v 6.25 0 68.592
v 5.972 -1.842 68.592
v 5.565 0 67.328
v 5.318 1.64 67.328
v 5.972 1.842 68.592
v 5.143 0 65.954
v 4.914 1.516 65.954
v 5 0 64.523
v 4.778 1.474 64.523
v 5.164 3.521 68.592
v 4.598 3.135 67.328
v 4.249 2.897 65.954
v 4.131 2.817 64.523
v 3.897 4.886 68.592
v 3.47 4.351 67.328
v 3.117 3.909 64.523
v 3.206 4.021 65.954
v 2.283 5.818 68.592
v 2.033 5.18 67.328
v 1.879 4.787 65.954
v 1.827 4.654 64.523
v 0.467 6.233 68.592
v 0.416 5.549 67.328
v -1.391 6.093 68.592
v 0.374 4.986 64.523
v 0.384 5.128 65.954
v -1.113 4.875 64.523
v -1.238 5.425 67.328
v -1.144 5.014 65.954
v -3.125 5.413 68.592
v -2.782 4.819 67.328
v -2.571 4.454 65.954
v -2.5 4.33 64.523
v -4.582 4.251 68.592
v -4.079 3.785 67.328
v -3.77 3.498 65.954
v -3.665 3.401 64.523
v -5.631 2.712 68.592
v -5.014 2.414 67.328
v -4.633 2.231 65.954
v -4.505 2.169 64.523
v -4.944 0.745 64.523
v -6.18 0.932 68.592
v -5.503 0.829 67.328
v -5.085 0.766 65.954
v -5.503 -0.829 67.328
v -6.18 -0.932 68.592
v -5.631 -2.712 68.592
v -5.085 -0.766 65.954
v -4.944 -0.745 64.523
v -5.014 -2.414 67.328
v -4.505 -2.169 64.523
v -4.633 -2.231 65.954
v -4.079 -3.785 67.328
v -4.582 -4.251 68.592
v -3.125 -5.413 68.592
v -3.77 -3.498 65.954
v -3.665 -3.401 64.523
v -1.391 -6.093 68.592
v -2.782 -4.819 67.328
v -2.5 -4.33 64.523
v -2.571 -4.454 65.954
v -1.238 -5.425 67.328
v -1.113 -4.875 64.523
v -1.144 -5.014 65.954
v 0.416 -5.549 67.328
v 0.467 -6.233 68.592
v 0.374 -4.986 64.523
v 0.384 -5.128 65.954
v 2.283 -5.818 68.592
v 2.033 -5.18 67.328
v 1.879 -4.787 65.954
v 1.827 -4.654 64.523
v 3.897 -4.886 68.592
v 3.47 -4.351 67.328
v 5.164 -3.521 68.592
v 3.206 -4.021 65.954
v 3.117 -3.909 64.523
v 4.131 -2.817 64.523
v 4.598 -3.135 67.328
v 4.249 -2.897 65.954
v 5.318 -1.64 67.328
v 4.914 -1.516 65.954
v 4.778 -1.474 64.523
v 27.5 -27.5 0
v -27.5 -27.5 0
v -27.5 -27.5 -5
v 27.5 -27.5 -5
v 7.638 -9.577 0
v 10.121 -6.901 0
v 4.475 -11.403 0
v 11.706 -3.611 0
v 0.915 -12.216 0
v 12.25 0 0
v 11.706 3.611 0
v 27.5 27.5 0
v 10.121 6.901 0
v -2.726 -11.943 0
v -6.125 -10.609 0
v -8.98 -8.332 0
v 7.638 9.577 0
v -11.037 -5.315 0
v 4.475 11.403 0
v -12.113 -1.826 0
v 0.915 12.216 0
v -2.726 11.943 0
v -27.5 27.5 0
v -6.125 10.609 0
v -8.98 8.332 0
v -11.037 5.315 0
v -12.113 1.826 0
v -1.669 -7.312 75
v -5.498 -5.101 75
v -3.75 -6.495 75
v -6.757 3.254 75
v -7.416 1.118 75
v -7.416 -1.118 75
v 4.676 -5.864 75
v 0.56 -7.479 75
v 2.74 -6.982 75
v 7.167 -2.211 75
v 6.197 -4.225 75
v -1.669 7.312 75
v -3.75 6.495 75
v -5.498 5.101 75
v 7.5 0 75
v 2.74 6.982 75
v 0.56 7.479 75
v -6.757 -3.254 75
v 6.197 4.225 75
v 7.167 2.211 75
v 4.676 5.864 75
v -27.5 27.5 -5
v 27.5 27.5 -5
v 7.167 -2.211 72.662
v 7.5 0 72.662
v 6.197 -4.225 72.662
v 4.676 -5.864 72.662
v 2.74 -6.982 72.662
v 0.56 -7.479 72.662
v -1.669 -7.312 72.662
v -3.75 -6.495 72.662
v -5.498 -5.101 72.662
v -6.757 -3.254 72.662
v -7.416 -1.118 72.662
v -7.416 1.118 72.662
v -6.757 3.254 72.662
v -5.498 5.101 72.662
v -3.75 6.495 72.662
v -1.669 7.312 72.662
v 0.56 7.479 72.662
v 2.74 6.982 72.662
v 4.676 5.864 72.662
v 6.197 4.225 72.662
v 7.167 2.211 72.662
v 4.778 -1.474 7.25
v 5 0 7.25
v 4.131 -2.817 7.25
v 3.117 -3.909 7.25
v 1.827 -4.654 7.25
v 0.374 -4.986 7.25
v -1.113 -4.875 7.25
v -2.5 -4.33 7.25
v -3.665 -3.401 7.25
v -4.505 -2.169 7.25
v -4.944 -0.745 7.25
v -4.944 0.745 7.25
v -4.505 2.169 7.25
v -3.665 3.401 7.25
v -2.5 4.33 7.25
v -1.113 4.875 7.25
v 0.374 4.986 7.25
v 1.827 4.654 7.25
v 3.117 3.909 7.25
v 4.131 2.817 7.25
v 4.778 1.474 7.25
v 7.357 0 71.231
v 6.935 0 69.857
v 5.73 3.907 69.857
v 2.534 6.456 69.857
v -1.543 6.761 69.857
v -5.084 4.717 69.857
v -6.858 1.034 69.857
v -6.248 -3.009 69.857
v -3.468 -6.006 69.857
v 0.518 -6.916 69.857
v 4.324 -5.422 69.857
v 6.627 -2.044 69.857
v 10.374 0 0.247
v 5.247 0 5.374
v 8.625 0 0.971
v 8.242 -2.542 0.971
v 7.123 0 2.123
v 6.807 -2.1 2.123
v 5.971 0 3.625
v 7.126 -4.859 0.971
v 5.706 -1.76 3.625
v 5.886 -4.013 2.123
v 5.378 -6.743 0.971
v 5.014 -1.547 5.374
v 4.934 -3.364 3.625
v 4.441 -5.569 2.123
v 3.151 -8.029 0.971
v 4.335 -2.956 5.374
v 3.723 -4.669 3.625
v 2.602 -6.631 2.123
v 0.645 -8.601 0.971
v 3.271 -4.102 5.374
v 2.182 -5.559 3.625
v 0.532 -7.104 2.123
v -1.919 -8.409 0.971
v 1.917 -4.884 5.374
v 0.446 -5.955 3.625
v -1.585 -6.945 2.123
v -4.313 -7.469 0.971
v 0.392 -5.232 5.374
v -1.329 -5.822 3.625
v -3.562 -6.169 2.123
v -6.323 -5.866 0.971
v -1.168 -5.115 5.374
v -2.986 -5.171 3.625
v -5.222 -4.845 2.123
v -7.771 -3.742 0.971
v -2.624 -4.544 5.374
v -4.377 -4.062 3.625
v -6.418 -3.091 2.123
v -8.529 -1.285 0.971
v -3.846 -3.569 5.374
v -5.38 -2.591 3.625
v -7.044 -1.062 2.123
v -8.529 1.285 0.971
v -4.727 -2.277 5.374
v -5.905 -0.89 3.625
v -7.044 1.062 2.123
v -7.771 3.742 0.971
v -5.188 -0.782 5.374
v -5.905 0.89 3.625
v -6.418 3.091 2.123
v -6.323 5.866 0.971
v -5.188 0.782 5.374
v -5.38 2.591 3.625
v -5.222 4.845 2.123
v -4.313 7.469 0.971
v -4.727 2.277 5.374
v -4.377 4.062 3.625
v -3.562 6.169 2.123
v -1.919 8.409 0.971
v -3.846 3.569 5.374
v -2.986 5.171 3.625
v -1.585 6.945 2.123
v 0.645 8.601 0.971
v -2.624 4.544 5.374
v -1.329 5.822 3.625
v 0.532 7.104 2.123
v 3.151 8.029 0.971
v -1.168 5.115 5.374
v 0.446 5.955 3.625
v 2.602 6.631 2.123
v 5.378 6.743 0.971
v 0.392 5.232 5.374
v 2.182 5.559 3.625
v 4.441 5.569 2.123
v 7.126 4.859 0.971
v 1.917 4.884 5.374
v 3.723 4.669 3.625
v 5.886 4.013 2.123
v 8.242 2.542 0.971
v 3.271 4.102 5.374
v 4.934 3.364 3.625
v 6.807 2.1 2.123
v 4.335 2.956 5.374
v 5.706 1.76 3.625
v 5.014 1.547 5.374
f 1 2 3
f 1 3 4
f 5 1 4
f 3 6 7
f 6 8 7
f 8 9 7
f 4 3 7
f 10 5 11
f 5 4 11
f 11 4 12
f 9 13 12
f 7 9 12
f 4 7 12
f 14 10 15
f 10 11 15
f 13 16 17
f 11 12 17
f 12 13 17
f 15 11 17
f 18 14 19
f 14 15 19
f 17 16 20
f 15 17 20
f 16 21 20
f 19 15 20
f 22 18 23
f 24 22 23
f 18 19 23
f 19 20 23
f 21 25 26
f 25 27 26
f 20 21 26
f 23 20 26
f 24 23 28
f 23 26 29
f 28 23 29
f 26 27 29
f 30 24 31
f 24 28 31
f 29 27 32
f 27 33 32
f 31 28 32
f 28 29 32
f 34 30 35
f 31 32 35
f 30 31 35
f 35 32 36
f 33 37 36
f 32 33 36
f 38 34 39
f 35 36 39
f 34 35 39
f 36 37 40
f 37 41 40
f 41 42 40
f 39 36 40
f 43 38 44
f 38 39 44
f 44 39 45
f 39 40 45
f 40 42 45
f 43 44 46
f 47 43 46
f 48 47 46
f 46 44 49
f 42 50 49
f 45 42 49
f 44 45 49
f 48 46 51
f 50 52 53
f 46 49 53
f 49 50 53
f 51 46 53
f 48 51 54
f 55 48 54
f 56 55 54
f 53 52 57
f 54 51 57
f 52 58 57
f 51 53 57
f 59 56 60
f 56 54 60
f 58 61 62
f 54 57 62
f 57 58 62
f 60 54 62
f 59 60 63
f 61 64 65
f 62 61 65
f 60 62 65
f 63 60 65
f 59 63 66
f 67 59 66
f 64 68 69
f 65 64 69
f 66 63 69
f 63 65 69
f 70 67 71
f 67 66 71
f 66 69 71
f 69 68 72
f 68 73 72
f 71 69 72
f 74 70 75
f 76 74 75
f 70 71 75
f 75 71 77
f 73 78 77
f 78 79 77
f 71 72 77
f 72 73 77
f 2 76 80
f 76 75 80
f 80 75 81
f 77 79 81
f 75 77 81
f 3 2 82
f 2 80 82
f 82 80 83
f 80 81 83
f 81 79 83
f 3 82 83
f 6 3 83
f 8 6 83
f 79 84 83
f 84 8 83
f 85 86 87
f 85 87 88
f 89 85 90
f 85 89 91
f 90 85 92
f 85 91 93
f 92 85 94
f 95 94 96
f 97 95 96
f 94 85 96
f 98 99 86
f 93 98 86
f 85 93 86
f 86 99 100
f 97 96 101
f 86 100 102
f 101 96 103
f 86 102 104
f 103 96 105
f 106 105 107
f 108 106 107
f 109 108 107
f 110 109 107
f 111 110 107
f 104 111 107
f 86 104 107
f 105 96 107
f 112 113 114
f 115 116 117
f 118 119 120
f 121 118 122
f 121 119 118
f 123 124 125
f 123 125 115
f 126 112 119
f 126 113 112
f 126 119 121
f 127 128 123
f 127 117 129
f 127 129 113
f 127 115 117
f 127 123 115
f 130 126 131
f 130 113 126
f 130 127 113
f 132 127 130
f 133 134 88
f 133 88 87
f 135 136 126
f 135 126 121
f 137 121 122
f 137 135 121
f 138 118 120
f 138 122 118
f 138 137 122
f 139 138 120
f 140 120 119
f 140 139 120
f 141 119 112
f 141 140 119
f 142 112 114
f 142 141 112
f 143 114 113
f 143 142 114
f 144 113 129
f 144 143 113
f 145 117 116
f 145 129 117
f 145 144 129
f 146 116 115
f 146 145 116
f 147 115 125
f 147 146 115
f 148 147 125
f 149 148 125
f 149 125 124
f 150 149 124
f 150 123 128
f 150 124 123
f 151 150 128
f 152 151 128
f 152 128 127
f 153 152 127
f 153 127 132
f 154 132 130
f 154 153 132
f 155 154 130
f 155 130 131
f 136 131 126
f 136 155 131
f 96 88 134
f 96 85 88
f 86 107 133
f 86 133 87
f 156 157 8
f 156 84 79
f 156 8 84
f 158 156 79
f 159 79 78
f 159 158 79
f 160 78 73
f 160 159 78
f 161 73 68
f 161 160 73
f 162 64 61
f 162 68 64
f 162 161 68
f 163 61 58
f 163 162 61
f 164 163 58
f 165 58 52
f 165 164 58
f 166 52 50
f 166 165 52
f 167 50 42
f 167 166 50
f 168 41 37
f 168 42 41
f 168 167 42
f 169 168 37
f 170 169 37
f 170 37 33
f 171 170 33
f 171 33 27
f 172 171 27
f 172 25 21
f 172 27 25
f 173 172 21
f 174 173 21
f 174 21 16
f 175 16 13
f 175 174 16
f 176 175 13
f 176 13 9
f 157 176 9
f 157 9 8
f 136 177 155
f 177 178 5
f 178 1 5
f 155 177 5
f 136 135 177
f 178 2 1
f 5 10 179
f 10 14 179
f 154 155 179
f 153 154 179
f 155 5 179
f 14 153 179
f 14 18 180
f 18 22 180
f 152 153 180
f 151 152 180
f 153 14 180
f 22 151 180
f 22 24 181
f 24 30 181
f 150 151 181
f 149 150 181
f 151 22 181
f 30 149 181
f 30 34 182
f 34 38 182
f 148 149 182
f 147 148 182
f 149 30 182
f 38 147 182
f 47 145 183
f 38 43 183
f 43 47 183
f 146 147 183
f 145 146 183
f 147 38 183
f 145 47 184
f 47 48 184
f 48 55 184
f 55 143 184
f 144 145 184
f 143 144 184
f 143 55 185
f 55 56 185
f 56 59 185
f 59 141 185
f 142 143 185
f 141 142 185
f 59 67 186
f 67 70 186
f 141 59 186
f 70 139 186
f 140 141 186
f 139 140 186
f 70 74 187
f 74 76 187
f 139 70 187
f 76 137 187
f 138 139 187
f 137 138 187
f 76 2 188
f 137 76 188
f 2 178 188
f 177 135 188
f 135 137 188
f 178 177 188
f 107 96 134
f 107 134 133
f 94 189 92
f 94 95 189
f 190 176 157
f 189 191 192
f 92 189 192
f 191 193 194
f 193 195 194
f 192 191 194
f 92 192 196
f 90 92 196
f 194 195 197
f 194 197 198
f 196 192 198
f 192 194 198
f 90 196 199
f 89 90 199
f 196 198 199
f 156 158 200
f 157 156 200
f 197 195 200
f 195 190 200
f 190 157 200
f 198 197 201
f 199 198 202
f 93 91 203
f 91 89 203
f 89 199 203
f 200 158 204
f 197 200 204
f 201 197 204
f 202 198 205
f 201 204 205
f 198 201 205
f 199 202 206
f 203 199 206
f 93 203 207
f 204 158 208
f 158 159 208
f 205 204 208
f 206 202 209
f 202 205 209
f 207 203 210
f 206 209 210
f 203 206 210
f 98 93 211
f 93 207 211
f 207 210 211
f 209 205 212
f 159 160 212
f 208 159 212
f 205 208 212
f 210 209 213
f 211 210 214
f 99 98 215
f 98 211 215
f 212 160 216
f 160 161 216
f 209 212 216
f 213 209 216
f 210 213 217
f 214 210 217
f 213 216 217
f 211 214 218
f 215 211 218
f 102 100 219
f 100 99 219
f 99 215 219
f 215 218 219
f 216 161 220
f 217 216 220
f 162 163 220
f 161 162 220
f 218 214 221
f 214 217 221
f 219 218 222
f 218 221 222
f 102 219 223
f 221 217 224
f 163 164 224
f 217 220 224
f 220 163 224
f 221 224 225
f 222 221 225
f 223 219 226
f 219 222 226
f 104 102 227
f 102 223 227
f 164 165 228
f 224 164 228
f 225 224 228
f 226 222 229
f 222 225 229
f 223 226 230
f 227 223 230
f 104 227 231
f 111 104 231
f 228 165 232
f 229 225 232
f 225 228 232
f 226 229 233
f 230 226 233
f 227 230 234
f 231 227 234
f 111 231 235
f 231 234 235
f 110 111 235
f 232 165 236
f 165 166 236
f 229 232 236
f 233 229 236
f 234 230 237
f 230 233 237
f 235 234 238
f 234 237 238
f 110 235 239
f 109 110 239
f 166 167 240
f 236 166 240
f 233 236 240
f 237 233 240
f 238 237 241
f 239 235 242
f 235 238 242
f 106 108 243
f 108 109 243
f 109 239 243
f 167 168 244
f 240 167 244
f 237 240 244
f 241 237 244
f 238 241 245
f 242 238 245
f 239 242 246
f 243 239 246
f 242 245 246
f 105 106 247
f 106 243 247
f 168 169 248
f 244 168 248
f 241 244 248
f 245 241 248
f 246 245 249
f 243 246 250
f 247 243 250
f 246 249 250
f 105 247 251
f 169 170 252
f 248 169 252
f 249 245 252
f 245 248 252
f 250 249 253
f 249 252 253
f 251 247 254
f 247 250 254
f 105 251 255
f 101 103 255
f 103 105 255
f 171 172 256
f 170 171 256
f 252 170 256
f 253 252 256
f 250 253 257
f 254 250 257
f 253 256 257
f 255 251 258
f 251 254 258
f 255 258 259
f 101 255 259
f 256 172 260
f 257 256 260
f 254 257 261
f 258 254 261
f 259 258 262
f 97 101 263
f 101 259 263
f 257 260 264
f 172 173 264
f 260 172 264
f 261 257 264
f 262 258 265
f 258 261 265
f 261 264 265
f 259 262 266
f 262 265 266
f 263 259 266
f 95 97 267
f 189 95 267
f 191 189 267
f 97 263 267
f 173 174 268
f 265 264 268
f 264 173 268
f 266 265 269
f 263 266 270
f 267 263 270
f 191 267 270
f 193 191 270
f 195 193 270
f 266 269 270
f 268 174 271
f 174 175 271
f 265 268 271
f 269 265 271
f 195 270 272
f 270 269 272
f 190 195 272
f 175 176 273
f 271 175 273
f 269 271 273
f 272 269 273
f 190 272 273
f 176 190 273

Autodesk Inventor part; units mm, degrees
ref_plane "YZ Plane" through (0, 0, 0) normal (1, 0, 0) x (0, 1, 0)
ref_plane "XZ Plane" through (0, 0, 0) normal (0, 1, 0) x (-1, 0, 0)
ref_plane "XY Plane" through (0, 0, 0) normal (0, 0, 1) x (1, 0, 0)
sketch "Sketch1" plane through (0, 0, 0) normal (0, 0, 1) x (1, 0, 0)
  circle A0 centre (0, 0) radius 5
  dimension "d0" = 10
extrude "Extrusion1" add sketch "Sketch1" along normal blind 70
sketch "Sketch2" plane through (0, 0, 70) normal (0, 0, 1) x (1, 0, 0)
  circle A0 centre (0, 0) radius 7.5
  dimension "d3" = 15
extrude "Extrusion2" add sketch "Sketch2" along normal blind 5
fillet "Fillet1" radius 7.25 2 edges at (-5, 0, 70) (-7.5, 0, 70)
sketch "Sketch3" plane through (0, 0, 0) normal (0, 0, -1) x (-1, 0, 0)
  line L0 (27.5, -27.5) -> (-27.5, -27.5)
  line L1 (-27.5, -27.5) -> (-27.5, 27.5)
  line L2 (-27.5, 27.5) -> (27.5, 27.5)
  line L3 (27.5, 27.5) -> (27.5, -27.5)
  line L4 (27.5, -27.5) -> (-27.5, 27.5) construction
  line L5 (-27.5, -27.5) -> (27.5, 27.5) construction
  point P0 (0, 0)
  dimension "d7" = 55
  dimension "d8" = 55
extrude "Extrusion3" add sketch "Sketch3" along normal blind 5
fillet "Fillet2" radius 7.25 1 edges at (-5, 0, 0)
properties part number "Base"
